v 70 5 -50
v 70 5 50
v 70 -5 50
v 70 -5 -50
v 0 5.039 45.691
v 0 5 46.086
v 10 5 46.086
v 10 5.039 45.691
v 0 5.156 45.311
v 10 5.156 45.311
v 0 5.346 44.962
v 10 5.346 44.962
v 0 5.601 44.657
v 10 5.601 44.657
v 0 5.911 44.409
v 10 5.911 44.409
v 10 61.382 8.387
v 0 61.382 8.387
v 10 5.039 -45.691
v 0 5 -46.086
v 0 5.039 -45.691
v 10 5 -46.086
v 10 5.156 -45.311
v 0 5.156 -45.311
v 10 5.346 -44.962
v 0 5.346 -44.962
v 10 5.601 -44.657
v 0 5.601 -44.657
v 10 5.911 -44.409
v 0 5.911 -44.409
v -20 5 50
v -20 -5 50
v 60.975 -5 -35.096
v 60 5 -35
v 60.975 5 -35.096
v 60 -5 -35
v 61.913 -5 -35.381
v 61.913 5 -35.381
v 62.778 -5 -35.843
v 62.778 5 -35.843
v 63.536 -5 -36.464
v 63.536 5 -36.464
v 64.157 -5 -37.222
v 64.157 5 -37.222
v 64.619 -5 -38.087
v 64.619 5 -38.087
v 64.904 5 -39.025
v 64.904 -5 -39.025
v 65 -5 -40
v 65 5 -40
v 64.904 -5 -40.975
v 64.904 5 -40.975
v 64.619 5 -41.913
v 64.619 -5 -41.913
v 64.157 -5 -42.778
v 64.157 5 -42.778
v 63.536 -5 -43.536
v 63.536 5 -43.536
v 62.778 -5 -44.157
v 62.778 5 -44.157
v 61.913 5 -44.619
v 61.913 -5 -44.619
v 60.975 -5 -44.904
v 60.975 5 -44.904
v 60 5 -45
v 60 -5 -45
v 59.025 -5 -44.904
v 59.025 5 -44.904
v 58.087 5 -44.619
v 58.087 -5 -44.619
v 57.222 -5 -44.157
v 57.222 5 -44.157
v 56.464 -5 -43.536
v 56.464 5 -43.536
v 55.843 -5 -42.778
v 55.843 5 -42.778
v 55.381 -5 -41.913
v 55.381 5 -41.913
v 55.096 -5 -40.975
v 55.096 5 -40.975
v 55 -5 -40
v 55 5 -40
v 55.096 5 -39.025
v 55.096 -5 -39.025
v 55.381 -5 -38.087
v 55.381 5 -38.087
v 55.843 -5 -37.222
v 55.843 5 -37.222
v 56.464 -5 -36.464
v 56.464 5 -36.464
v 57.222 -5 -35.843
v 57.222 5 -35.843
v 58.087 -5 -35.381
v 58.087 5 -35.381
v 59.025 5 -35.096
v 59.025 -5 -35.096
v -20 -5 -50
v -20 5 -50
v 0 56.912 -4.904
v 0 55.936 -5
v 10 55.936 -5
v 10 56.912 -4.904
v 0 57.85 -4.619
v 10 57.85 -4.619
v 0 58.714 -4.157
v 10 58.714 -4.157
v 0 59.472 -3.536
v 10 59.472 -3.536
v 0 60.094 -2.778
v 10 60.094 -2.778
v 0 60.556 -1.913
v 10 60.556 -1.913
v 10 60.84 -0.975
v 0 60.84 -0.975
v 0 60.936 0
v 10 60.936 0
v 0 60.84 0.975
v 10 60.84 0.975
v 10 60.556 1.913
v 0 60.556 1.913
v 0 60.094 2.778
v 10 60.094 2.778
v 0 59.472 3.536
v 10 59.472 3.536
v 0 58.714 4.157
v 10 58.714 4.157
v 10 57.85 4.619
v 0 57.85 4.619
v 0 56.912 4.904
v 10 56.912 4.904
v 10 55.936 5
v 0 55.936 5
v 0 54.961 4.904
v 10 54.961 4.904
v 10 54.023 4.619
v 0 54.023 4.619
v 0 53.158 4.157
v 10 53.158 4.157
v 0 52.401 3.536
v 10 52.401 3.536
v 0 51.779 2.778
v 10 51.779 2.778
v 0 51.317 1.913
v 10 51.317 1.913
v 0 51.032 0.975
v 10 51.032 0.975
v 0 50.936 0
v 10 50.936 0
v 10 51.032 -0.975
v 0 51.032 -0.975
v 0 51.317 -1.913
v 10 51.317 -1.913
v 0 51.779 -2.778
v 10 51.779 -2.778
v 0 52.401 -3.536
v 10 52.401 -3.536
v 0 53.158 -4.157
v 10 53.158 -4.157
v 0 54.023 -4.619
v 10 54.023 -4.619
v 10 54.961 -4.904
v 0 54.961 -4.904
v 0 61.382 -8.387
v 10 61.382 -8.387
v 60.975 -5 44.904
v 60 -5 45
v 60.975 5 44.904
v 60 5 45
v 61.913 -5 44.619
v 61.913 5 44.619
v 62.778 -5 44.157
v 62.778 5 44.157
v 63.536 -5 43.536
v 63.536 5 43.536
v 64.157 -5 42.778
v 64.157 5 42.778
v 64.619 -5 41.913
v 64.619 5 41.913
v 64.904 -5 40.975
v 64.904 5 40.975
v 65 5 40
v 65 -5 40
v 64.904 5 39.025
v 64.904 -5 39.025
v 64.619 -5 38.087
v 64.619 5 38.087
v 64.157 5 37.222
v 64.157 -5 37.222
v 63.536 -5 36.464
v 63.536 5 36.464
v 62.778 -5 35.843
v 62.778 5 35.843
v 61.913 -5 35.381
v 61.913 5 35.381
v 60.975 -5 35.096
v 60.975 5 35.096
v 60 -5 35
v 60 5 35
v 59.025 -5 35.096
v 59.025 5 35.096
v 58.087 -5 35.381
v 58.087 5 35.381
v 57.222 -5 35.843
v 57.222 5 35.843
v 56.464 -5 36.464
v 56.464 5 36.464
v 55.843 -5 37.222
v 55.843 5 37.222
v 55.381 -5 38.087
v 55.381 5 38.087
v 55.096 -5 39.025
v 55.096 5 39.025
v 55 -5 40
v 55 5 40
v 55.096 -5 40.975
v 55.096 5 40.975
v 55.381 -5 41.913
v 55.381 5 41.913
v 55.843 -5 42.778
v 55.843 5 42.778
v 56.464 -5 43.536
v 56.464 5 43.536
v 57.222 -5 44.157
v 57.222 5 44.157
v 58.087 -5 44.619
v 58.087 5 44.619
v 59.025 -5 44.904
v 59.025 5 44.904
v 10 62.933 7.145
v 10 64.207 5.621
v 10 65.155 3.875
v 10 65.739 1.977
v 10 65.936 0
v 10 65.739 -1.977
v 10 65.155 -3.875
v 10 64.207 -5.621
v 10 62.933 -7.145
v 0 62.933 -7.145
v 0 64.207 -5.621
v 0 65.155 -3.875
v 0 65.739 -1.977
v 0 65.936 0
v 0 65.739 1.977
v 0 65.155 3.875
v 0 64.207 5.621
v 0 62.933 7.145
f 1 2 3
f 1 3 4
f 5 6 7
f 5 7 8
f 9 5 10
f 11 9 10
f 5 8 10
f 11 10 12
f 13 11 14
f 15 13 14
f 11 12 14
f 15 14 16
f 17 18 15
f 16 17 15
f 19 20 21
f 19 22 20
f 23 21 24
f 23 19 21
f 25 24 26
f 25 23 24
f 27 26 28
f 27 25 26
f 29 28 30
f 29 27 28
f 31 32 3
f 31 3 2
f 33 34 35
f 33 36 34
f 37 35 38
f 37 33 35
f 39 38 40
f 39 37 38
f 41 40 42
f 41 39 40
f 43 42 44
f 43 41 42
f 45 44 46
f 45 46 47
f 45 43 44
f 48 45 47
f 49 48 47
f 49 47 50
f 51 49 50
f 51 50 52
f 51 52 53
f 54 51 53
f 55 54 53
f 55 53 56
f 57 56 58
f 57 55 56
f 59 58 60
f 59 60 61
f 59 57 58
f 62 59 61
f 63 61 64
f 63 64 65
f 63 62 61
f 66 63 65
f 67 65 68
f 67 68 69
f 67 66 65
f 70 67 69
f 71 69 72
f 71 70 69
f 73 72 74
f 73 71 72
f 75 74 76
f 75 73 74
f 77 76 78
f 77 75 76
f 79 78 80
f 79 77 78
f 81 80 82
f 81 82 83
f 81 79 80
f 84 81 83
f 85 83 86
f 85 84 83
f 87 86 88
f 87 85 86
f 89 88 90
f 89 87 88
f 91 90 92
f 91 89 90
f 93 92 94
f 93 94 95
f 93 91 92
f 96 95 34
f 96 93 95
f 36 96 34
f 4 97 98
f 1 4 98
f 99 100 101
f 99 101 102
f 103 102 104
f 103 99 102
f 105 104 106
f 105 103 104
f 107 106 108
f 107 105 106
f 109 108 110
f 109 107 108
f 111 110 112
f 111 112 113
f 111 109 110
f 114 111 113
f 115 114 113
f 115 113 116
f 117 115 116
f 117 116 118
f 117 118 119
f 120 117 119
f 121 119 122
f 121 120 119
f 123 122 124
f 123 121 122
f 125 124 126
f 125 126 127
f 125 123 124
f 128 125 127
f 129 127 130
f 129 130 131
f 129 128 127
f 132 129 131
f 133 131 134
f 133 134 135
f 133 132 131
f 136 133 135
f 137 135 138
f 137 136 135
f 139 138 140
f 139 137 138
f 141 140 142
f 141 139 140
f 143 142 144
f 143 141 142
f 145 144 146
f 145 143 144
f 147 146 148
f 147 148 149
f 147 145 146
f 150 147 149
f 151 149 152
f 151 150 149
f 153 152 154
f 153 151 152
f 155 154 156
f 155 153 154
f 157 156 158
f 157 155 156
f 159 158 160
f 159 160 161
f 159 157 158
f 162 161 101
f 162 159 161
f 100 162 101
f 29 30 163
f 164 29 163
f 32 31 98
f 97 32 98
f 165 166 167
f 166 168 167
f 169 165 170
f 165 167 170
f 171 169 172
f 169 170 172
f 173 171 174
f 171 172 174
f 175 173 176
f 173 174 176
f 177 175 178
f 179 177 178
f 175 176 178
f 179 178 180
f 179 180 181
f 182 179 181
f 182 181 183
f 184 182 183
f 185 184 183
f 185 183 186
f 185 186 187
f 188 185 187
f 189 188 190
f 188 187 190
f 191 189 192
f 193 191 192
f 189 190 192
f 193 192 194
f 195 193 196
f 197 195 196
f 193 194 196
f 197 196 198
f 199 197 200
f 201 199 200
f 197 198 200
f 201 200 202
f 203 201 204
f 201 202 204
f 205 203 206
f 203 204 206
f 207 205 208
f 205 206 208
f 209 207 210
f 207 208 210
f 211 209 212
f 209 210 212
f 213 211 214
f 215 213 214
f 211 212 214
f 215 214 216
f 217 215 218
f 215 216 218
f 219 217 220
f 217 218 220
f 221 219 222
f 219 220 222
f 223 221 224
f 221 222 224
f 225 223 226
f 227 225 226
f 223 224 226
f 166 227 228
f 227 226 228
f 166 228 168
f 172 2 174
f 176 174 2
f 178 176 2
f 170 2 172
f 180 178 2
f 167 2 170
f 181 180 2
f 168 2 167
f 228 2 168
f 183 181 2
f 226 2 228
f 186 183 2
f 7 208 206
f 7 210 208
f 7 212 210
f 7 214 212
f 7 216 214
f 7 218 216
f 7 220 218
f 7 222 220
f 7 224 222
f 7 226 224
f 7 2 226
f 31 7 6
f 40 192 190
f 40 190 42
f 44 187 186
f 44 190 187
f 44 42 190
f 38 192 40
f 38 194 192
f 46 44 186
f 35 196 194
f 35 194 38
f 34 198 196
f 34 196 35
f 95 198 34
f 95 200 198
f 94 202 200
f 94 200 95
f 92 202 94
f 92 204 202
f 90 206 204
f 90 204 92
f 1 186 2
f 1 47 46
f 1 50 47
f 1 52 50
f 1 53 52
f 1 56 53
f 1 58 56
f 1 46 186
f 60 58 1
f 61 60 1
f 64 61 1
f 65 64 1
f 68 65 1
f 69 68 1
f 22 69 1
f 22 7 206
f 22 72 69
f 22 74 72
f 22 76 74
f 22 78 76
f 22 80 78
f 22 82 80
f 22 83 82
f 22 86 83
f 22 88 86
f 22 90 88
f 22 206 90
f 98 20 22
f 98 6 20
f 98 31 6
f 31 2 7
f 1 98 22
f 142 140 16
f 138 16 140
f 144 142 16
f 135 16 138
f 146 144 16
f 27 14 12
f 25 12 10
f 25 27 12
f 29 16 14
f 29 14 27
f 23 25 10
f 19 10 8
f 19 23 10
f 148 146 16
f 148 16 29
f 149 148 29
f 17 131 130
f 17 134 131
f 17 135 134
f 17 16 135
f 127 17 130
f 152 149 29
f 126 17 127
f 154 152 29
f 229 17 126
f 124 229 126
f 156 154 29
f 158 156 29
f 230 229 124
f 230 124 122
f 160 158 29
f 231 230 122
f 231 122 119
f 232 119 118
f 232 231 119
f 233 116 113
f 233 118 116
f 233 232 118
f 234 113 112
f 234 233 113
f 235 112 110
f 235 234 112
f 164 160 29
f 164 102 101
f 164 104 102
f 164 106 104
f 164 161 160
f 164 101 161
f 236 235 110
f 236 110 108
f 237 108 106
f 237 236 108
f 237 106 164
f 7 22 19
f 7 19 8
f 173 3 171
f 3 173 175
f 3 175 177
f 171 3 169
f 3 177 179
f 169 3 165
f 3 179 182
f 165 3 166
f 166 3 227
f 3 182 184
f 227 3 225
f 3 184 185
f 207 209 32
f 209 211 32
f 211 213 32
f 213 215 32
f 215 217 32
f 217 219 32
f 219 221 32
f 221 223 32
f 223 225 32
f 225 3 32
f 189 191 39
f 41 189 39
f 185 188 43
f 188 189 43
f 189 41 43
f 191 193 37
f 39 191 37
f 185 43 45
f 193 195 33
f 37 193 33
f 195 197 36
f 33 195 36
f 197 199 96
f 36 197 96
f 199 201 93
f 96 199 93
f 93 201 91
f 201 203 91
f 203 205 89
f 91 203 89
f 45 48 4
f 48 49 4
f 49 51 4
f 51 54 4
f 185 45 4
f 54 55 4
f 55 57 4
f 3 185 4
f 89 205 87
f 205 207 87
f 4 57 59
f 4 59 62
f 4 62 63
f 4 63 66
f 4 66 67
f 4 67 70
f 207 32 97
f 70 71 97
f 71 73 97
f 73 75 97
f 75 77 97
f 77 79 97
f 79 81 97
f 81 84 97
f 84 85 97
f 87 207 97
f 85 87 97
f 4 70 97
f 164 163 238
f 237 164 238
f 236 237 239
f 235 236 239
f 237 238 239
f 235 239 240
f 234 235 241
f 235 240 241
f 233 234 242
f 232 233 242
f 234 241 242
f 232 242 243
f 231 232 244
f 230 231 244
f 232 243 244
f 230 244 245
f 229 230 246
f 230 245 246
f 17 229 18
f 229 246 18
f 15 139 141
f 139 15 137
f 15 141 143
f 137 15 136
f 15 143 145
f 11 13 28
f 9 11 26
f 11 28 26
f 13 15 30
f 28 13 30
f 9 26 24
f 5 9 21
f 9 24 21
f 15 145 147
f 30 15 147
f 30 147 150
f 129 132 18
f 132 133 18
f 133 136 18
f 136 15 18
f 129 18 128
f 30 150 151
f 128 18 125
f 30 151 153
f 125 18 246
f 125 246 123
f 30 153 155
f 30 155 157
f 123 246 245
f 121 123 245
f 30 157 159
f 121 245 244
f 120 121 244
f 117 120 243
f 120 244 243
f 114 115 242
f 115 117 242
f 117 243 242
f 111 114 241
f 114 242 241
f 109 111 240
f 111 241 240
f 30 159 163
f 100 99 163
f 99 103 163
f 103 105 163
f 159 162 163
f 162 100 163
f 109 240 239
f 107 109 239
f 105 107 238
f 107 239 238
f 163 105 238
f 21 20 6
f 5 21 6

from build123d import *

# Parameters (mm, degrees)
SKETCH2_R                = 5
BOSS_EXTRUDE1_DEPTH      = 10
BOSS_EXTRUDE2_DEPTH      = 70
BOSS_EXTRUDE2_DEPTH_BACK = 20
SKETCH3_R                = 5
CUT_EXTRUDE1_DEPTH       = 5
FILLET1_R                = 2


with BuildPart() as part:
    # Sketch2 → Boss-Extrude1 (new body)
    with BuildSketch(Plane(origin=(0, 0, 0), x_dir=(0, 0, -1), z_dir=(1, 0, 0))):
        with BuildLine():
            Line((-8.38684039, 61.382374771), (-45, 5))
            Line((-45, 5), (45, 5))
            Line((45, 5), (8.38684039, 61.382374771))
            ThreePointArc((8.38684039, 61.382374771), (0, 65.936191862), (-8.38684039, 61.382374771))
        make_face()
        with Locations((0, 55.936191862)):
            Circle(SKETCH2_R, mode=Mode.SUBTRACT)
    extrude(amount=BOSS_EXTRUDE1_DEPTH)

    # Sketch2<3> → Boss-Extrude2 (add, two sides: drawn at the far end of the back side and taken through both)
    with BuildSketch(Plane(origin=(0, 0, 0), x_dir=(0, 0, -1), z_dir=(1, 0, 0)).offset(-BOSS_EXTRUDE2_DEPTH_BACK)):
        Polygon((-50, 5), (-50, -5), (50, -5), (50, 5), (45, 5), (-45, 5), align=None)
    extrude(amount=BOSS_EXTRUDE2_DEPTH + BOSS_EXTRUDE2_DEPTH_BACK)

    # Sketch3 → Cut-Extrude1 (cut, symmetric)
    with BuildSketch(Plane(origin=(0, 0, 0), x_dir=(1, 0, 0), z_dir=(0, 1, 0))):
        with Locations((60, 40)):
            Circle(SKETCH3_R)
        with Locations((60, -40)):
            Circle(SKETCH3_R)
    extrude(amount=CUT_EXTRUDE1_DEPTH, both=True, mode=Mode.SUBTRACT)

    # Fillet1
    fillet1_edges = [part.edges().sort_by_distance(p)[0] for p in [
        (5, 5, 45),
        (5, 5, -45),
    ]]
    fillet(fillet1_edges, radius=FILLET1_R)


solid = part.part
